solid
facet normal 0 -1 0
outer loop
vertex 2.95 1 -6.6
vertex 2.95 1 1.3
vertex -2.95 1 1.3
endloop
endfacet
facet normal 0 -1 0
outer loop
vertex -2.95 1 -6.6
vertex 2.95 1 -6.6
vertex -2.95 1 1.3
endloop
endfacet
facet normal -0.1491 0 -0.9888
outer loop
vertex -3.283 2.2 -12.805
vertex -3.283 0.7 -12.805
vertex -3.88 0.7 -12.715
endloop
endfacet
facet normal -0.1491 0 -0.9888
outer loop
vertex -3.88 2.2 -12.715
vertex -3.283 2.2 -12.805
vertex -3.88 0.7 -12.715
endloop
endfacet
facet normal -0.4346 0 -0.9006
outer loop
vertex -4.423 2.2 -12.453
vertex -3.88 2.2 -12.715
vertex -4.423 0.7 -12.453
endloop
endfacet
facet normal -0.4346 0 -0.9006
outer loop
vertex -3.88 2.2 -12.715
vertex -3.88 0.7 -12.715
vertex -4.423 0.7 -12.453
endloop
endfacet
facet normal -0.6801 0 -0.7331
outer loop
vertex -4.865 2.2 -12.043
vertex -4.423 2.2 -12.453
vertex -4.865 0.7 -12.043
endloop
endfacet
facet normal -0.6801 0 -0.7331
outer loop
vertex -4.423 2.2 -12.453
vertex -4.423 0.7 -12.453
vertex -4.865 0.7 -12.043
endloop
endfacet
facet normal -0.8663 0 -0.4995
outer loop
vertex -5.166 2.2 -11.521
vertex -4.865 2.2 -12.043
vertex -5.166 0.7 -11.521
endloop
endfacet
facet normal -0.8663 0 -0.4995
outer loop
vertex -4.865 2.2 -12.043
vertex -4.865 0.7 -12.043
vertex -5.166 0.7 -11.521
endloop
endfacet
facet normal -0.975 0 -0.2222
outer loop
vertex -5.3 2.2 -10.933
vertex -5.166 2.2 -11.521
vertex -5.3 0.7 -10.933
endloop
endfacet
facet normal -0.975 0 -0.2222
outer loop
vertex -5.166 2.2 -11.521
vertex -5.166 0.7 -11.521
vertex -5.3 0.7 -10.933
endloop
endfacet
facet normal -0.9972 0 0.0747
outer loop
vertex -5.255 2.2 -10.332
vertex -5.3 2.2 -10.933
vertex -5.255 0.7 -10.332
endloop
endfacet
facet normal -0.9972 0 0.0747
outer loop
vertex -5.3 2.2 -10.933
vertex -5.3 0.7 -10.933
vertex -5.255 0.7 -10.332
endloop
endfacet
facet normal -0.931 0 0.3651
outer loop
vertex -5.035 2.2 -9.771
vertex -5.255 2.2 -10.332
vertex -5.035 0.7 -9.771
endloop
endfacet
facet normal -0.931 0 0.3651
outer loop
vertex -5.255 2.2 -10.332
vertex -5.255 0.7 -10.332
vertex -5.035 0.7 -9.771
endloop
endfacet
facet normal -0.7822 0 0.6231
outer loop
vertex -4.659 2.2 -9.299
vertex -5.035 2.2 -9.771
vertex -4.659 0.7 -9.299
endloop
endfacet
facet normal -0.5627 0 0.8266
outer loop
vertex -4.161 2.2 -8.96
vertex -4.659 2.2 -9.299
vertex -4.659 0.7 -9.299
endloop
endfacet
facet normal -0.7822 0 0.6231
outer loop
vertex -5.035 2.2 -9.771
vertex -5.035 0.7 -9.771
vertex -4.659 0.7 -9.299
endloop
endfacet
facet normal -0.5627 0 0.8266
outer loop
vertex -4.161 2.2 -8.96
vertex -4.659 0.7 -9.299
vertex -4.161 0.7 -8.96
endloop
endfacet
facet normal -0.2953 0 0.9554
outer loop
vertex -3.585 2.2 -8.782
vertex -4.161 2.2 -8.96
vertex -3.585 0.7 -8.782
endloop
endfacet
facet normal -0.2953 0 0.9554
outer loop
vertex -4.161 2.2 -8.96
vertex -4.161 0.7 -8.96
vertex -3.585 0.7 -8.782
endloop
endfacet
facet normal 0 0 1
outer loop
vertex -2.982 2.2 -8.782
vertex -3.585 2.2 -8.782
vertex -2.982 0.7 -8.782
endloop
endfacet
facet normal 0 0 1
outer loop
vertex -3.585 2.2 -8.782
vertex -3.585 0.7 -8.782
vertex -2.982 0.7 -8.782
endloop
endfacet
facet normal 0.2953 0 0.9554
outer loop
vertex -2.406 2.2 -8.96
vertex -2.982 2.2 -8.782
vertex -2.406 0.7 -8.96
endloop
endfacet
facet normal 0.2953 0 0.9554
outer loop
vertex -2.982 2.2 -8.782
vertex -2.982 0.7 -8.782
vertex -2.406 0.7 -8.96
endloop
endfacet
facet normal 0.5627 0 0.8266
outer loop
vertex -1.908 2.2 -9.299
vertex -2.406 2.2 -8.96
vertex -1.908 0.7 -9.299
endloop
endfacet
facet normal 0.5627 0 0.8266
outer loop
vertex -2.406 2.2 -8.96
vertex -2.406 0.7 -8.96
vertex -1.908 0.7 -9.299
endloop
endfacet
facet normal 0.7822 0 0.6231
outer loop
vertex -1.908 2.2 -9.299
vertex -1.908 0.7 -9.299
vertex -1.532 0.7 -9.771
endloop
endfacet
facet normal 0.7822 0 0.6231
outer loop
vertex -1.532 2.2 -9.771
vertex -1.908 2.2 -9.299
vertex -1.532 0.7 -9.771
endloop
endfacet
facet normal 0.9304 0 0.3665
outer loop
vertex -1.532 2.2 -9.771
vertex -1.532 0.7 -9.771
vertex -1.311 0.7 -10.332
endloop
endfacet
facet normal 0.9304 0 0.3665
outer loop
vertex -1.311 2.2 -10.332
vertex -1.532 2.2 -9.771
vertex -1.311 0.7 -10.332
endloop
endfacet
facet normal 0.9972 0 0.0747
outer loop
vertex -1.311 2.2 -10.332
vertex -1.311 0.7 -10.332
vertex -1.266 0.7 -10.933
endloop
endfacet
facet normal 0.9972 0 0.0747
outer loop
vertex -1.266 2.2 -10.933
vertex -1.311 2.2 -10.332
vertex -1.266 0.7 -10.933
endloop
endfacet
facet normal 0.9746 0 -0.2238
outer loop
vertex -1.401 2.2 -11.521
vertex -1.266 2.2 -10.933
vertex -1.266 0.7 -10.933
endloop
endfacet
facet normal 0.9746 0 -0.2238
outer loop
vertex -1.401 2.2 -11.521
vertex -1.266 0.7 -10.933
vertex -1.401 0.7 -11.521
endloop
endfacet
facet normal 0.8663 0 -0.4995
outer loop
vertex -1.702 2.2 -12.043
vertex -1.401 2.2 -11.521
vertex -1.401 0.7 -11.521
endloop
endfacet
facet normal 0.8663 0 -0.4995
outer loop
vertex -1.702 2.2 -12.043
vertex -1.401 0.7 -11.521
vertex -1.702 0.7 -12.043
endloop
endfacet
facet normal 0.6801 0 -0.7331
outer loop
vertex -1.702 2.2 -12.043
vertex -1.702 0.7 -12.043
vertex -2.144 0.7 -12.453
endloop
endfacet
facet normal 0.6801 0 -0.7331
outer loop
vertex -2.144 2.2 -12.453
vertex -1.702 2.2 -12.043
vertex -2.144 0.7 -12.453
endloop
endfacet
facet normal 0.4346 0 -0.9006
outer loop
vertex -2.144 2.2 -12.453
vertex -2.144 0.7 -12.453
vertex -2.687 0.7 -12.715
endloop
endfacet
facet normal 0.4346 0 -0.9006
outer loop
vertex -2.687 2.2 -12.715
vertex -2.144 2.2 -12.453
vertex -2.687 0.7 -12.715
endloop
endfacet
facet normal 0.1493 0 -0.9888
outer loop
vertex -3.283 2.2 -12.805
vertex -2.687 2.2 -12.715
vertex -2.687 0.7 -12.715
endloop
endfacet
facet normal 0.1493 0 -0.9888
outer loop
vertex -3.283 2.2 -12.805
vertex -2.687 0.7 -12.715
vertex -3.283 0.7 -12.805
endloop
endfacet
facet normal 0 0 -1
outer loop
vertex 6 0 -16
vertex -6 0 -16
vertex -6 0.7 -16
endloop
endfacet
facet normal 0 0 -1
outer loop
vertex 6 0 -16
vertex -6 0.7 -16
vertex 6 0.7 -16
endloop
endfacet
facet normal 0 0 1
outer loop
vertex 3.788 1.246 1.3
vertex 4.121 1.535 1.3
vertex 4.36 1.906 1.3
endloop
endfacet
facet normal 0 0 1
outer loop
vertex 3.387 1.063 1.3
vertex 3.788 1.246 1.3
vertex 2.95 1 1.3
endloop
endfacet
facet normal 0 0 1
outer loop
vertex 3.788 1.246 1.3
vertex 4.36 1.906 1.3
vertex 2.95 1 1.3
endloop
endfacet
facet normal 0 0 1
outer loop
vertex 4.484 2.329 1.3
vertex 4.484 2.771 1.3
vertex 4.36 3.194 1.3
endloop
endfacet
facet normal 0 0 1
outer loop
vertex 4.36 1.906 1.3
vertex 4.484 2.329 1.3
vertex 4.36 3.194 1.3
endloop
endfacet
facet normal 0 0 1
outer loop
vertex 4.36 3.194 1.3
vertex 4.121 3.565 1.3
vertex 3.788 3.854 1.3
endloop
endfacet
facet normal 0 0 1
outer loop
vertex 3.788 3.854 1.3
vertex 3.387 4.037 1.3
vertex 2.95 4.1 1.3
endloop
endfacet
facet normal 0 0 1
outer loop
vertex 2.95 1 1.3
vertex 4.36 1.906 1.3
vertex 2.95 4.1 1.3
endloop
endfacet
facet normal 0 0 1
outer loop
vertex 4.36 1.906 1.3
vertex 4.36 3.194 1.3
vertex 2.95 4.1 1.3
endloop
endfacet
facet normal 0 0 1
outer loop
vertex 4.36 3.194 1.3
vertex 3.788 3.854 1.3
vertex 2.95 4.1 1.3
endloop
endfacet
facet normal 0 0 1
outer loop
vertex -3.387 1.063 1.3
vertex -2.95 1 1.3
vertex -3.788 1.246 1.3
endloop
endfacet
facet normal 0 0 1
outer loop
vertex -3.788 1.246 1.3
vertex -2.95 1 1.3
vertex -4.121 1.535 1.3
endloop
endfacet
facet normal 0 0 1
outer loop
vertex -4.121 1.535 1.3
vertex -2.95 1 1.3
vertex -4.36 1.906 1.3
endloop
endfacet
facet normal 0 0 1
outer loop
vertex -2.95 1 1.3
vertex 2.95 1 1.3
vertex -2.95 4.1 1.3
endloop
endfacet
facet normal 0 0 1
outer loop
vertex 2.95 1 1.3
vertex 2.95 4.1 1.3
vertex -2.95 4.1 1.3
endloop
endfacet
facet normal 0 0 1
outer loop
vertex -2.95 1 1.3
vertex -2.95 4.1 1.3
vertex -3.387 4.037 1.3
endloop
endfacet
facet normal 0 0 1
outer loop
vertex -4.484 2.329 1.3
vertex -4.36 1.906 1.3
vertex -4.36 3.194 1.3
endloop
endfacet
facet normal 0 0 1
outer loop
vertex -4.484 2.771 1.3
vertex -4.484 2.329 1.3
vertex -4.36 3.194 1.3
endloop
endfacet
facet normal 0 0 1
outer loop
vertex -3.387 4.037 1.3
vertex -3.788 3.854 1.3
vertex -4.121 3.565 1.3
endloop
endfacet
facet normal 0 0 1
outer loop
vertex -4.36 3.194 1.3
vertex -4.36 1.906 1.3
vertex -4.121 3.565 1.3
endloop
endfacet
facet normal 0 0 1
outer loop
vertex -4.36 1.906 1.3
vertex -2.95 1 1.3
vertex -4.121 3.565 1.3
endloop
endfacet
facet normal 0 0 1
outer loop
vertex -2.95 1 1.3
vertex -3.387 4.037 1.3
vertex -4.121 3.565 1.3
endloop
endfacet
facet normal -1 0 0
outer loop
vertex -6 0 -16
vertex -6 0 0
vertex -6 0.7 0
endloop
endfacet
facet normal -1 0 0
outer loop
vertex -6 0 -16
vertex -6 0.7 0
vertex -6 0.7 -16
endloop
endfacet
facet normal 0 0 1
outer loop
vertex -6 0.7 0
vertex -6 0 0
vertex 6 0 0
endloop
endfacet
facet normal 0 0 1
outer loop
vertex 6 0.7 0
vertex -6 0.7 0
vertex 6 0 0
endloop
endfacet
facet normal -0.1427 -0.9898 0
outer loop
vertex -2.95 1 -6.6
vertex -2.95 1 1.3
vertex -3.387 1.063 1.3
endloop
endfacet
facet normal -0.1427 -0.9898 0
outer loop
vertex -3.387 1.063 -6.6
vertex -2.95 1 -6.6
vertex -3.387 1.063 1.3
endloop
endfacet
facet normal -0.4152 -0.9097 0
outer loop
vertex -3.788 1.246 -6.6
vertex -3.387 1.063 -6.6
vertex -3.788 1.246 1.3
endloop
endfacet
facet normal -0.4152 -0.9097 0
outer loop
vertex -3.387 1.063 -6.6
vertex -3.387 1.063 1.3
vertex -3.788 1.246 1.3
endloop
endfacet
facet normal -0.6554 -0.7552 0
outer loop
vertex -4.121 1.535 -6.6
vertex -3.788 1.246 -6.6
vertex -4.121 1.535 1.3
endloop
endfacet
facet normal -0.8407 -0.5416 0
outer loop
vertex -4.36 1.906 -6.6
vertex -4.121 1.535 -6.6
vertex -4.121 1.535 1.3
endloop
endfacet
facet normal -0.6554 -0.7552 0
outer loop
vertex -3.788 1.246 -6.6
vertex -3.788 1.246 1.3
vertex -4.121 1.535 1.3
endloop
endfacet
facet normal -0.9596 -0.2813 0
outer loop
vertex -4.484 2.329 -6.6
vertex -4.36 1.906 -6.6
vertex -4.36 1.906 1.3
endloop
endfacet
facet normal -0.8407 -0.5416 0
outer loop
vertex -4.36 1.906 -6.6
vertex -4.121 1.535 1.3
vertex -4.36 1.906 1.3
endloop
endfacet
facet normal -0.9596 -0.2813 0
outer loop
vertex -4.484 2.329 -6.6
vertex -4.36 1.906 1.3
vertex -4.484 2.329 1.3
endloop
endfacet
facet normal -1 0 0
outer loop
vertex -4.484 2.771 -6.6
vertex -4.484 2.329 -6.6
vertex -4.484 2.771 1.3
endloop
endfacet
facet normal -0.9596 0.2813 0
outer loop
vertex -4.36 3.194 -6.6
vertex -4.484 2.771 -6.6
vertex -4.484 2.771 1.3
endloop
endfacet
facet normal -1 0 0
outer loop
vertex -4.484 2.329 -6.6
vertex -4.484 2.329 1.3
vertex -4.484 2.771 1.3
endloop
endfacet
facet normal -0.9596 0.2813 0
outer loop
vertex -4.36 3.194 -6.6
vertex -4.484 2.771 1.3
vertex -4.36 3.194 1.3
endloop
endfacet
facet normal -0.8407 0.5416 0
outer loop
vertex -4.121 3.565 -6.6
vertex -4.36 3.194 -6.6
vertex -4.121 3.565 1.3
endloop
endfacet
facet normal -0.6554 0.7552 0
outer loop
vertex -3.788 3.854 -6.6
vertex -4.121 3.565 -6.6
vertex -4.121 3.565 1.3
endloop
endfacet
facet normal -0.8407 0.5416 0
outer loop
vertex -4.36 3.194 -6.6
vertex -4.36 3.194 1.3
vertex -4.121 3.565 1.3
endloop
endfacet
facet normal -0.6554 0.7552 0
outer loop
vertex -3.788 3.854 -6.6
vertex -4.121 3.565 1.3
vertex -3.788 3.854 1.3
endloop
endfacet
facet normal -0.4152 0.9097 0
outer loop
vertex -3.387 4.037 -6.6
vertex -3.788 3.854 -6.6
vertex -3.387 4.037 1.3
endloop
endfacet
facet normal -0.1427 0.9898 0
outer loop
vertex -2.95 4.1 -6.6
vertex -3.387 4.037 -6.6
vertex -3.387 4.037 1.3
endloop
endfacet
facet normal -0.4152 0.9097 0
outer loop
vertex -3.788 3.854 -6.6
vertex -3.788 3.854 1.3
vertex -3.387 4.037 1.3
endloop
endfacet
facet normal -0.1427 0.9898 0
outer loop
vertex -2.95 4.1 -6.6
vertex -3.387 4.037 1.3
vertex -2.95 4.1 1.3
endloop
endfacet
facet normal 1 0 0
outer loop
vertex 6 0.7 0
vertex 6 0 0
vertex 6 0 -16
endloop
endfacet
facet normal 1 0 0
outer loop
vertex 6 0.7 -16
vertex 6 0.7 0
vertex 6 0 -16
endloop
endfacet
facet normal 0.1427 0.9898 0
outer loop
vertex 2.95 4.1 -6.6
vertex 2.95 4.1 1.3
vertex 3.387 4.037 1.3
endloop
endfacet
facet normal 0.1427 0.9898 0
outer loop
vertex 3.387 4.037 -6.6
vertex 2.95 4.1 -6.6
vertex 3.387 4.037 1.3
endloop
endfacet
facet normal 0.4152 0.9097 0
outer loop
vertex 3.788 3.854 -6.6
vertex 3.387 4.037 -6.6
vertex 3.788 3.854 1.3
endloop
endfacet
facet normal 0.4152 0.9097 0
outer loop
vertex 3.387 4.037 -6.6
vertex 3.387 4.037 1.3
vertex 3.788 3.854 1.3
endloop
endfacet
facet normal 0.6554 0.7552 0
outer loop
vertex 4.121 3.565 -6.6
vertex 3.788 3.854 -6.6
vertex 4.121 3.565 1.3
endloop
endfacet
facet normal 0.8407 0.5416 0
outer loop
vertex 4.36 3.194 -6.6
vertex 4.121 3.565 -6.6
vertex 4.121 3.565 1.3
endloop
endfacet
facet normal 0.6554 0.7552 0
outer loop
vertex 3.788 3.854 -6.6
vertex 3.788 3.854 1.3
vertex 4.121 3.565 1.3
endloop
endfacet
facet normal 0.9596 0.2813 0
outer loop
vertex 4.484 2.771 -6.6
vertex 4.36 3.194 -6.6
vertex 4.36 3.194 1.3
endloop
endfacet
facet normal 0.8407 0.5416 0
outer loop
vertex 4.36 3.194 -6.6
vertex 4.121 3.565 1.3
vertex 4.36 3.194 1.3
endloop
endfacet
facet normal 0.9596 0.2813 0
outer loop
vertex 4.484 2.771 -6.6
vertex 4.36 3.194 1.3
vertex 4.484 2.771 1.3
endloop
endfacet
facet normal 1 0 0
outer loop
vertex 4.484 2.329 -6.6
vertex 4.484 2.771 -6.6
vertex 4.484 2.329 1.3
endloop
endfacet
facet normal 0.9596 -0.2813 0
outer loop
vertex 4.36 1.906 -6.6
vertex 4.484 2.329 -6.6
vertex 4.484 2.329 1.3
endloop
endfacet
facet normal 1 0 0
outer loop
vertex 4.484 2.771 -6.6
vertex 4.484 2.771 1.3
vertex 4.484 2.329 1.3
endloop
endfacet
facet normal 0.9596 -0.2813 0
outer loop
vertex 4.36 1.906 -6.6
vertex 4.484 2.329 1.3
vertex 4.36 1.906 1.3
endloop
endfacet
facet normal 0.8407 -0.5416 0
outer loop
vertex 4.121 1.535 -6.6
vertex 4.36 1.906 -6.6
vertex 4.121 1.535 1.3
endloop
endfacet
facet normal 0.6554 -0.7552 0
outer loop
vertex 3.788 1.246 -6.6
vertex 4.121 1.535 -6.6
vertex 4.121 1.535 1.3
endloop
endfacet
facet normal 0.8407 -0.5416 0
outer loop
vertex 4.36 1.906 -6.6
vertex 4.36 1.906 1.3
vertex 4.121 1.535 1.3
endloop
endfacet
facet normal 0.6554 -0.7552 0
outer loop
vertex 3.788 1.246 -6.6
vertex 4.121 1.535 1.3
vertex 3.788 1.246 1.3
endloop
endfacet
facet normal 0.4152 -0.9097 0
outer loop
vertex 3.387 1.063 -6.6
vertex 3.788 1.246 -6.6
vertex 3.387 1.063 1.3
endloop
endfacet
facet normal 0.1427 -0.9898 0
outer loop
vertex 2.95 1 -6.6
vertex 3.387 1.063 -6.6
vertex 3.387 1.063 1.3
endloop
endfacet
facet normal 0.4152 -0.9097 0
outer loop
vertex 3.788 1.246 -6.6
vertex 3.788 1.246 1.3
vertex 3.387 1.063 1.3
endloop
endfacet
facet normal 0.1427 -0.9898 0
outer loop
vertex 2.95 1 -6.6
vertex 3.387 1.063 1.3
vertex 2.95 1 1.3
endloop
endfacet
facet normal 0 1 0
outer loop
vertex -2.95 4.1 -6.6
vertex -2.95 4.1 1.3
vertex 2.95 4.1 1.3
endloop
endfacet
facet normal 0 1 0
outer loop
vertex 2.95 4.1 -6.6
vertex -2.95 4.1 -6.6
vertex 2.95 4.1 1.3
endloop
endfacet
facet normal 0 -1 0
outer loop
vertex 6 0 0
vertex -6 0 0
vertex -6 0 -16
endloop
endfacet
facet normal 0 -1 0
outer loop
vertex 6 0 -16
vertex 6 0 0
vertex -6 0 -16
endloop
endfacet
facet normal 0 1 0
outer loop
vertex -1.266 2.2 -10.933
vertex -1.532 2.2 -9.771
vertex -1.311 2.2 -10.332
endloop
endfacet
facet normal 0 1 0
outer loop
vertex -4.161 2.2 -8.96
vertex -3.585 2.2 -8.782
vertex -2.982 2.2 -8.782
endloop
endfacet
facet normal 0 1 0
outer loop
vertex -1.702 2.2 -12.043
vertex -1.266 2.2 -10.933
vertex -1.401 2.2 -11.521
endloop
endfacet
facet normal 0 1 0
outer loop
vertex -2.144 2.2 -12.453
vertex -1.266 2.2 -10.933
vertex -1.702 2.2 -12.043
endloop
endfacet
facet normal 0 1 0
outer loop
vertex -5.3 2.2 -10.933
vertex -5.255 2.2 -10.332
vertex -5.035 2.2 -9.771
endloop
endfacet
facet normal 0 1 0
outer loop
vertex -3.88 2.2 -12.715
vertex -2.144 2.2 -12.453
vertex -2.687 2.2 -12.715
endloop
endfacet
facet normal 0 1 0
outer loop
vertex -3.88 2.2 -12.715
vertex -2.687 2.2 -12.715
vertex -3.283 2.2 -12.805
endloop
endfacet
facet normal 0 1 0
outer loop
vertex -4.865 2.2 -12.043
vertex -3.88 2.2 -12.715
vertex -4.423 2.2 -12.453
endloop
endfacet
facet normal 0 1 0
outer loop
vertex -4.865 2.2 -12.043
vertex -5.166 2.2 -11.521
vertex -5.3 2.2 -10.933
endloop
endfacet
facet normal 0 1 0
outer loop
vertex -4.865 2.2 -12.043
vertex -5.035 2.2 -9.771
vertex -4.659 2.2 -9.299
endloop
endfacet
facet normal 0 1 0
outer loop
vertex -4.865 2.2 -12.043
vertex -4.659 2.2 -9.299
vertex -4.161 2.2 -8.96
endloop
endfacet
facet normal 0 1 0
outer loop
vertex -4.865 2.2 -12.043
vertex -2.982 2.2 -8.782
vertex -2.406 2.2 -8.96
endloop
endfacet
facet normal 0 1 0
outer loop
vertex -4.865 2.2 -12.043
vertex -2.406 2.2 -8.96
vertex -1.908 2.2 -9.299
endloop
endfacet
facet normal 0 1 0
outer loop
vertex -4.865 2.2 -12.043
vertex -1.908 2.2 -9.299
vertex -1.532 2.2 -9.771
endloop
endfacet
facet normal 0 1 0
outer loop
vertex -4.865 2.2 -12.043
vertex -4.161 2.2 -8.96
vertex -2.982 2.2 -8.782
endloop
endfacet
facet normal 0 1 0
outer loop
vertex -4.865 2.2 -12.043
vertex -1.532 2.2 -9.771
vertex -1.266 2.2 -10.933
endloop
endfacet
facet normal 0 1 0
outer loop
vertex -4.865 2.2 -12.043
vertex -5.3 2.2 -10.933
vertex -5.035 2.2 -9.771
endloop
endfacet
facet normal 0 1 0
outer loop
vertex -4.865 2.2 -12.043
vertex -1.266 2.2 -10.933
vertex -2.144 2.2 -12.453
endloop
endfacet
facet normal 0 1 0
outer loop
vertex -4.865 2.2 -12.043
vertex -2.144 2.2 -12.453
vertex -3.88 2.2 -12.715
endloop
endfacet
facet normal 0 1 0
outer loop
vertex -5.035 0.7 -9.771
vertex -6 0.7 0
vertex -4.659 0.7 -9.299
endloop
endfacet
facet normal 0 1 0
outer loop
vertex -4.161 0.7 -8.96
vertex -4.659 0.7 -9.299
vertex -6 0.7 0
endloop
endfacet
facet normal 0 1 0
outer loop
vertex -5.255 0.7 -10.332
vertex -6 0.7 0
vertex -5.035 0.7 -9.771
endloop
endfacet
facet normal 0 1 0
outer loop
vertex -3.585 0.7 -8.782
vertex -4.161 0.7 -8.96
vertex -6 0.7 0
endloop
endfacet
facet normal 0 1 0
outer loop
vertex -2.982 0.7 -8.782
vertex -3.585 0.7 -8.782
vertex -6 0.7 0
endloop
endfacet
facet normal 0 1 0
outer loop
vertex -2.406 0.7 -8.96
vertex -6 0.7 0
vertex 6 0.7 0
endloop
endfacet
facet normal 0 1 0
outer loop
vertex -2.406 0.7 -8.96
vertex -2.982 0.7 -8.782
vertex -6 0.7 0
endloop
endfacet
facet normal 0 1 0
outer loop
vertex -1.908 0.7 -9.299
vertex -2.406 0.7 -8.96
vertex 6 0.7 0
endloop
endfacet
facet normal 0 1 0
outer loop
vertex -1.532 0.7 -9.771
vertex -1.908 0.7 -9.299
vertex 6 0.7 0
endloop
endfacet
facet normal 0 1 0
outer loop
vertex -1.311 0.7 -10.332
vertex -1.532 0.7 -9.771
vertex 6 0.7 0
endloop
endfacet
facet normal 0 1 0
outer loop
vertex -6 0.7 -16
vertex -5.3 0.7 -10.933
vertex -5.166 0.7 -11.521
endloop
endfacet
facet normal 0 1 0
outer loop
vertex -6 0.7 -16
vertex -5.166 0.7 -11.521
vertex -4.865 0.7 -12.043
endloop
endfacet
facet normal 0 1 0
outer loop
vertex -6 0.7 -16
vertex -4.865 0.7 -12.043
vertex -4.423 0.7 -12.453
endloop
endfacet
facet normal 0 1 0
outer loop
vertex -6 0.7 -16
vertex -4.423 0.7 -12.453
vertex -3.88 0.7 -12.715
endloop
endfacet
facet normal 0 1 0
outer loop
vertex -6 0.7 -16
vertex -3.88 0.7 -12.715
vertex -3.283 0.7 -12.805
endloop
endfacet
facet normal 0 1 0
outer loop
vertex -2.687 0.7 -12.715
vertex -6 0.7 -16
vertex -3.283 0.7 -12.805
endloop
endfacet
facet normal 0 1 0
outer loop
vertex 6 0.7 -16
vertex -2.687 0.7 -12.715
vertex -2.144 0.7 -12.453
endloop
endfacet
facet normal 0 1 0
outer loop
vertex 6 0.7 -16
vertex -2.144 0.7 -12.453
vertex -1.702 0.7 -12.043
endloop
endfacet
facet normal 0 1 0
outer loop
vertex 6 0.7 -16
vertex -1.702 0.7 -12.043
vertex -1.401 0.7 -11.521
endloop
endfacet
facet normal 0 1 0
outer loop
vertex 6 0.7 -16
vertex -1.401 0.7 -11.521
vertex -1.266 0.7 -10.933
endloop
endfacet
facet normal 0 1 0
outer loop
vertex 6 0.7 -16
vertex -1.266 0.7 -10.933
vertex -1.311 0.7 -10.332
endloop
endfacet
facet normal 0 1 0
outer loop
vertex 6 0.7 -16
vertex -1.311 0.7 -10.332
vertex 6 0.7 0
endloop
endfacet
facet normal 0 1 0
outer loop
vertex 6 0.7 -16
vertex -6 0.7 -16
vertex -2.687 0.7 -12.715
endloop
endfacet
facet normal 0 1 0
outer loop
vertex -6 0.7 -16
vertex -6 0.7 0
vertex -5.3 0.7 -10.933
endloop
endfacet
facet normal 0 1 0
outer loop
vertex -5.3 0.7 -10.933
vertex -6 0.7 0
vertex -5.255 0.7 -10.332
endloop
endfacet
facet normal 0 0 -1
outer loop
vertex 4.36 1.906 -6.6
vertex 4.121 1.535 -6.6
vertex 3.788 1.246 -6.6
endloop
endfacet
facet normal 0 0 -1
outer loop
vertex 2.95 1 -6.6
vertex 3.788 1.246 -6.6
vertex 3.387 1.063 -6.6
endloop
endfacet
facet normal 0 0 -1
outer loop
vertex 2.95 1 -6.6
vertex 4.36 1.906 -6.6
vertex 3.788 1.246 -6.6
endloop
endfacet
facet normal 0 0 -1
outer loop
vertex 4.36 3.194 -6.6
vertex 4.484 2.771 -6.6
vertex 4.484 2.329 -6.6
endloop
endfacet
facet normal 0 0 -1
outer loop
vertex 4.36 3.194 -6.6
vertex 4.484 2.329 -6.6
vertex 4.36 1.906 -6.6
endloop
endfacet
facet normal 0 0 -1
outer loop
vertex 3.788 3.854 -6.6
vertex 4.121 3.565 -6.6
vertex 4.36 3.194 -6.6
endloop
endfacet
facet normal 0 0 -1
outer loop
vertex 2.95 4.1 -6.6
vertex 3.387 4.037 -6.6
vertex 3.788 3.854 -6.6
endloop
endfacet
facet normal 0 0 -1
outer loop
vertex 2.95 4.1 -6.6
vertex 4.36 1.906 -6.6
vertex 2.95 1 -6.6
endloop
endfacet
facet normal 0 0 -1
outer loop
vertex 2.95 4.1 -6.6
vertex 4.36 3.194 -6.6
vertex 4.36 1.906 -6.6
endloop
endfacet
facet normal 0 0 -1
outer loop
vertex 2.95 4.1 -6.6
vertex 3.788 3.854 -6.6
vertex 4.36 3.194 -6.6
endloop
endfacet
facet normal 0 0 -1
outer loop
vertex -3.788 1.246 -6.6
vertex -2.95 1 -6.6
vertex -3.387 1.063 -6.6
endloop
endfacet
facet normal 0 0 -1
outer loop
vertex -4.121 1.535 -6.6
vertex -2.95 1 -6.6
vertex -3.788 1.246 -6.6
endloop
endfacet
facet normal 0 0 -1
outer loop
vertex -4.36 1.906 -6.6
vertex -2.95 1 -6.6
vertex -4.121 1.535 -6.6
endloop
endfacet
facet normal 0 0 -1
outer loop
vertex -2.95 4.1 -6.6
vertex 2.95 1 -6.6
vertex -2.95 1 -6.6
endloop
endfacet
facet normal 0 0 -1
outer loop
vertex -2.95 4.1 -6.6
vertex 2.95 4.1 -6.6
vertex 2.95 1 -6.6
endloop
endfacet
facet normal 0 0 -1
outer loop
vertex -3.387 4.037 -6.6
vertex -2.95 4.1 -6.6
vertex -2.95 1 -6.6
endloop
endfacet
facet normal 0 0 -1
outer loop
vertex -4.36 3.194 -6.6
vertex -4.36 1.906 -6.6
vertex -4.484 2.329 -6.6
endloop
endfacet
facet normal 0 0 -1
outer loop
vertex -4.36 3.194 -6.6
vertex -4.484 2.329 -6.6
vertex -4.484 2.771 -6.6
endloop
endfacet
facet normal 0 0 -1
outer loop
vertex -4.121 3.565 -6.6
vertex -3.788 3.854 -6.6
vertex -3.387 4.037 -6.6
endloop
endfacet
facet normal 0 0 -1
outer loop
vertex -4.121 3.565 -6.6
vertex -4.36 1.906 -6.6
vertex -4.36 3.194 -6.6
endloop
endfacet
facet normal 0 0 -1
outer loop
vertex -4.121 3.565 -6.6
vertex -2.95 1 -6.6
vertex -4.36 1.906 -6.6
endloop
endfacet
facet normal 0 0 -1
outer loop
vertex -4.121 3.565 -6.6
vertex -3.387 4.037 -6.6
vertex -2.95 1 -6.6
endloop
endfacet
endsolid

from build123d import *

# Parameters (mm, degrees)
SKETCH_1_W      = 12
SKETCH_1_H      = 16
EXTRUDE_1_DEPTH = 0.7
EXTRUDE_START   = 1.3
EXTRUDE_2_DEPTH = 7.9
SKETCH_3_R      = 2.022600204
EXTRUDE_3_DEPTH = 2.2


with BuildPart() as part:
    # Эскиз1 → Бобышка-Вытянуть1 (new body)
    with BuildSketch(Plane(origin=(0, 0, 0), x_dir=(1, 0, 0), z_dir=(0, 1, 0))):
        with Locations((0, 8)):
            Rectangle(SKETCH_1_W, SKETCH_1_H)
    extrude(amount=EXTRUDE_1_DEPTH)

    # Эскиз3 → Бобышка-Вытянуть3 (add)
    with BuildSketch(Plane(origin=(0, 0, 0), x_dir=(1, 0, 0), z_dir=(0, 1, 0))):
        with Locations(Location((-3.283380281, 10.781918689, 0), (0, 0, 90))):
            Circle(SKETCH_3_R)
    extrude(amount=EXTRUDE_3_DEPTH)


with BuildPart() as body_2:
    # Эскиз2 → Бобышка-Вытянуть2 (new body)
    with BuildSketch(Plane.XY.offset(EXTRUDE_START)):
        with BuildLine():
            Line((-2.95, 4.1), (2.95, 4.1))
            ThreePointArc((2.95, 4.1), (4.5, 2.55), (2.95, 1))
            Line((2.95, 1), (-2.95, 1))
            ThreePointArc((-2.95, 1), (-4.5, 2.55), (-2.95, 4.1))
        make_face()
    extrude(amount=-EXTRUDE_2_DEPTH)


solid = Compound([part.part, body_2.part])
